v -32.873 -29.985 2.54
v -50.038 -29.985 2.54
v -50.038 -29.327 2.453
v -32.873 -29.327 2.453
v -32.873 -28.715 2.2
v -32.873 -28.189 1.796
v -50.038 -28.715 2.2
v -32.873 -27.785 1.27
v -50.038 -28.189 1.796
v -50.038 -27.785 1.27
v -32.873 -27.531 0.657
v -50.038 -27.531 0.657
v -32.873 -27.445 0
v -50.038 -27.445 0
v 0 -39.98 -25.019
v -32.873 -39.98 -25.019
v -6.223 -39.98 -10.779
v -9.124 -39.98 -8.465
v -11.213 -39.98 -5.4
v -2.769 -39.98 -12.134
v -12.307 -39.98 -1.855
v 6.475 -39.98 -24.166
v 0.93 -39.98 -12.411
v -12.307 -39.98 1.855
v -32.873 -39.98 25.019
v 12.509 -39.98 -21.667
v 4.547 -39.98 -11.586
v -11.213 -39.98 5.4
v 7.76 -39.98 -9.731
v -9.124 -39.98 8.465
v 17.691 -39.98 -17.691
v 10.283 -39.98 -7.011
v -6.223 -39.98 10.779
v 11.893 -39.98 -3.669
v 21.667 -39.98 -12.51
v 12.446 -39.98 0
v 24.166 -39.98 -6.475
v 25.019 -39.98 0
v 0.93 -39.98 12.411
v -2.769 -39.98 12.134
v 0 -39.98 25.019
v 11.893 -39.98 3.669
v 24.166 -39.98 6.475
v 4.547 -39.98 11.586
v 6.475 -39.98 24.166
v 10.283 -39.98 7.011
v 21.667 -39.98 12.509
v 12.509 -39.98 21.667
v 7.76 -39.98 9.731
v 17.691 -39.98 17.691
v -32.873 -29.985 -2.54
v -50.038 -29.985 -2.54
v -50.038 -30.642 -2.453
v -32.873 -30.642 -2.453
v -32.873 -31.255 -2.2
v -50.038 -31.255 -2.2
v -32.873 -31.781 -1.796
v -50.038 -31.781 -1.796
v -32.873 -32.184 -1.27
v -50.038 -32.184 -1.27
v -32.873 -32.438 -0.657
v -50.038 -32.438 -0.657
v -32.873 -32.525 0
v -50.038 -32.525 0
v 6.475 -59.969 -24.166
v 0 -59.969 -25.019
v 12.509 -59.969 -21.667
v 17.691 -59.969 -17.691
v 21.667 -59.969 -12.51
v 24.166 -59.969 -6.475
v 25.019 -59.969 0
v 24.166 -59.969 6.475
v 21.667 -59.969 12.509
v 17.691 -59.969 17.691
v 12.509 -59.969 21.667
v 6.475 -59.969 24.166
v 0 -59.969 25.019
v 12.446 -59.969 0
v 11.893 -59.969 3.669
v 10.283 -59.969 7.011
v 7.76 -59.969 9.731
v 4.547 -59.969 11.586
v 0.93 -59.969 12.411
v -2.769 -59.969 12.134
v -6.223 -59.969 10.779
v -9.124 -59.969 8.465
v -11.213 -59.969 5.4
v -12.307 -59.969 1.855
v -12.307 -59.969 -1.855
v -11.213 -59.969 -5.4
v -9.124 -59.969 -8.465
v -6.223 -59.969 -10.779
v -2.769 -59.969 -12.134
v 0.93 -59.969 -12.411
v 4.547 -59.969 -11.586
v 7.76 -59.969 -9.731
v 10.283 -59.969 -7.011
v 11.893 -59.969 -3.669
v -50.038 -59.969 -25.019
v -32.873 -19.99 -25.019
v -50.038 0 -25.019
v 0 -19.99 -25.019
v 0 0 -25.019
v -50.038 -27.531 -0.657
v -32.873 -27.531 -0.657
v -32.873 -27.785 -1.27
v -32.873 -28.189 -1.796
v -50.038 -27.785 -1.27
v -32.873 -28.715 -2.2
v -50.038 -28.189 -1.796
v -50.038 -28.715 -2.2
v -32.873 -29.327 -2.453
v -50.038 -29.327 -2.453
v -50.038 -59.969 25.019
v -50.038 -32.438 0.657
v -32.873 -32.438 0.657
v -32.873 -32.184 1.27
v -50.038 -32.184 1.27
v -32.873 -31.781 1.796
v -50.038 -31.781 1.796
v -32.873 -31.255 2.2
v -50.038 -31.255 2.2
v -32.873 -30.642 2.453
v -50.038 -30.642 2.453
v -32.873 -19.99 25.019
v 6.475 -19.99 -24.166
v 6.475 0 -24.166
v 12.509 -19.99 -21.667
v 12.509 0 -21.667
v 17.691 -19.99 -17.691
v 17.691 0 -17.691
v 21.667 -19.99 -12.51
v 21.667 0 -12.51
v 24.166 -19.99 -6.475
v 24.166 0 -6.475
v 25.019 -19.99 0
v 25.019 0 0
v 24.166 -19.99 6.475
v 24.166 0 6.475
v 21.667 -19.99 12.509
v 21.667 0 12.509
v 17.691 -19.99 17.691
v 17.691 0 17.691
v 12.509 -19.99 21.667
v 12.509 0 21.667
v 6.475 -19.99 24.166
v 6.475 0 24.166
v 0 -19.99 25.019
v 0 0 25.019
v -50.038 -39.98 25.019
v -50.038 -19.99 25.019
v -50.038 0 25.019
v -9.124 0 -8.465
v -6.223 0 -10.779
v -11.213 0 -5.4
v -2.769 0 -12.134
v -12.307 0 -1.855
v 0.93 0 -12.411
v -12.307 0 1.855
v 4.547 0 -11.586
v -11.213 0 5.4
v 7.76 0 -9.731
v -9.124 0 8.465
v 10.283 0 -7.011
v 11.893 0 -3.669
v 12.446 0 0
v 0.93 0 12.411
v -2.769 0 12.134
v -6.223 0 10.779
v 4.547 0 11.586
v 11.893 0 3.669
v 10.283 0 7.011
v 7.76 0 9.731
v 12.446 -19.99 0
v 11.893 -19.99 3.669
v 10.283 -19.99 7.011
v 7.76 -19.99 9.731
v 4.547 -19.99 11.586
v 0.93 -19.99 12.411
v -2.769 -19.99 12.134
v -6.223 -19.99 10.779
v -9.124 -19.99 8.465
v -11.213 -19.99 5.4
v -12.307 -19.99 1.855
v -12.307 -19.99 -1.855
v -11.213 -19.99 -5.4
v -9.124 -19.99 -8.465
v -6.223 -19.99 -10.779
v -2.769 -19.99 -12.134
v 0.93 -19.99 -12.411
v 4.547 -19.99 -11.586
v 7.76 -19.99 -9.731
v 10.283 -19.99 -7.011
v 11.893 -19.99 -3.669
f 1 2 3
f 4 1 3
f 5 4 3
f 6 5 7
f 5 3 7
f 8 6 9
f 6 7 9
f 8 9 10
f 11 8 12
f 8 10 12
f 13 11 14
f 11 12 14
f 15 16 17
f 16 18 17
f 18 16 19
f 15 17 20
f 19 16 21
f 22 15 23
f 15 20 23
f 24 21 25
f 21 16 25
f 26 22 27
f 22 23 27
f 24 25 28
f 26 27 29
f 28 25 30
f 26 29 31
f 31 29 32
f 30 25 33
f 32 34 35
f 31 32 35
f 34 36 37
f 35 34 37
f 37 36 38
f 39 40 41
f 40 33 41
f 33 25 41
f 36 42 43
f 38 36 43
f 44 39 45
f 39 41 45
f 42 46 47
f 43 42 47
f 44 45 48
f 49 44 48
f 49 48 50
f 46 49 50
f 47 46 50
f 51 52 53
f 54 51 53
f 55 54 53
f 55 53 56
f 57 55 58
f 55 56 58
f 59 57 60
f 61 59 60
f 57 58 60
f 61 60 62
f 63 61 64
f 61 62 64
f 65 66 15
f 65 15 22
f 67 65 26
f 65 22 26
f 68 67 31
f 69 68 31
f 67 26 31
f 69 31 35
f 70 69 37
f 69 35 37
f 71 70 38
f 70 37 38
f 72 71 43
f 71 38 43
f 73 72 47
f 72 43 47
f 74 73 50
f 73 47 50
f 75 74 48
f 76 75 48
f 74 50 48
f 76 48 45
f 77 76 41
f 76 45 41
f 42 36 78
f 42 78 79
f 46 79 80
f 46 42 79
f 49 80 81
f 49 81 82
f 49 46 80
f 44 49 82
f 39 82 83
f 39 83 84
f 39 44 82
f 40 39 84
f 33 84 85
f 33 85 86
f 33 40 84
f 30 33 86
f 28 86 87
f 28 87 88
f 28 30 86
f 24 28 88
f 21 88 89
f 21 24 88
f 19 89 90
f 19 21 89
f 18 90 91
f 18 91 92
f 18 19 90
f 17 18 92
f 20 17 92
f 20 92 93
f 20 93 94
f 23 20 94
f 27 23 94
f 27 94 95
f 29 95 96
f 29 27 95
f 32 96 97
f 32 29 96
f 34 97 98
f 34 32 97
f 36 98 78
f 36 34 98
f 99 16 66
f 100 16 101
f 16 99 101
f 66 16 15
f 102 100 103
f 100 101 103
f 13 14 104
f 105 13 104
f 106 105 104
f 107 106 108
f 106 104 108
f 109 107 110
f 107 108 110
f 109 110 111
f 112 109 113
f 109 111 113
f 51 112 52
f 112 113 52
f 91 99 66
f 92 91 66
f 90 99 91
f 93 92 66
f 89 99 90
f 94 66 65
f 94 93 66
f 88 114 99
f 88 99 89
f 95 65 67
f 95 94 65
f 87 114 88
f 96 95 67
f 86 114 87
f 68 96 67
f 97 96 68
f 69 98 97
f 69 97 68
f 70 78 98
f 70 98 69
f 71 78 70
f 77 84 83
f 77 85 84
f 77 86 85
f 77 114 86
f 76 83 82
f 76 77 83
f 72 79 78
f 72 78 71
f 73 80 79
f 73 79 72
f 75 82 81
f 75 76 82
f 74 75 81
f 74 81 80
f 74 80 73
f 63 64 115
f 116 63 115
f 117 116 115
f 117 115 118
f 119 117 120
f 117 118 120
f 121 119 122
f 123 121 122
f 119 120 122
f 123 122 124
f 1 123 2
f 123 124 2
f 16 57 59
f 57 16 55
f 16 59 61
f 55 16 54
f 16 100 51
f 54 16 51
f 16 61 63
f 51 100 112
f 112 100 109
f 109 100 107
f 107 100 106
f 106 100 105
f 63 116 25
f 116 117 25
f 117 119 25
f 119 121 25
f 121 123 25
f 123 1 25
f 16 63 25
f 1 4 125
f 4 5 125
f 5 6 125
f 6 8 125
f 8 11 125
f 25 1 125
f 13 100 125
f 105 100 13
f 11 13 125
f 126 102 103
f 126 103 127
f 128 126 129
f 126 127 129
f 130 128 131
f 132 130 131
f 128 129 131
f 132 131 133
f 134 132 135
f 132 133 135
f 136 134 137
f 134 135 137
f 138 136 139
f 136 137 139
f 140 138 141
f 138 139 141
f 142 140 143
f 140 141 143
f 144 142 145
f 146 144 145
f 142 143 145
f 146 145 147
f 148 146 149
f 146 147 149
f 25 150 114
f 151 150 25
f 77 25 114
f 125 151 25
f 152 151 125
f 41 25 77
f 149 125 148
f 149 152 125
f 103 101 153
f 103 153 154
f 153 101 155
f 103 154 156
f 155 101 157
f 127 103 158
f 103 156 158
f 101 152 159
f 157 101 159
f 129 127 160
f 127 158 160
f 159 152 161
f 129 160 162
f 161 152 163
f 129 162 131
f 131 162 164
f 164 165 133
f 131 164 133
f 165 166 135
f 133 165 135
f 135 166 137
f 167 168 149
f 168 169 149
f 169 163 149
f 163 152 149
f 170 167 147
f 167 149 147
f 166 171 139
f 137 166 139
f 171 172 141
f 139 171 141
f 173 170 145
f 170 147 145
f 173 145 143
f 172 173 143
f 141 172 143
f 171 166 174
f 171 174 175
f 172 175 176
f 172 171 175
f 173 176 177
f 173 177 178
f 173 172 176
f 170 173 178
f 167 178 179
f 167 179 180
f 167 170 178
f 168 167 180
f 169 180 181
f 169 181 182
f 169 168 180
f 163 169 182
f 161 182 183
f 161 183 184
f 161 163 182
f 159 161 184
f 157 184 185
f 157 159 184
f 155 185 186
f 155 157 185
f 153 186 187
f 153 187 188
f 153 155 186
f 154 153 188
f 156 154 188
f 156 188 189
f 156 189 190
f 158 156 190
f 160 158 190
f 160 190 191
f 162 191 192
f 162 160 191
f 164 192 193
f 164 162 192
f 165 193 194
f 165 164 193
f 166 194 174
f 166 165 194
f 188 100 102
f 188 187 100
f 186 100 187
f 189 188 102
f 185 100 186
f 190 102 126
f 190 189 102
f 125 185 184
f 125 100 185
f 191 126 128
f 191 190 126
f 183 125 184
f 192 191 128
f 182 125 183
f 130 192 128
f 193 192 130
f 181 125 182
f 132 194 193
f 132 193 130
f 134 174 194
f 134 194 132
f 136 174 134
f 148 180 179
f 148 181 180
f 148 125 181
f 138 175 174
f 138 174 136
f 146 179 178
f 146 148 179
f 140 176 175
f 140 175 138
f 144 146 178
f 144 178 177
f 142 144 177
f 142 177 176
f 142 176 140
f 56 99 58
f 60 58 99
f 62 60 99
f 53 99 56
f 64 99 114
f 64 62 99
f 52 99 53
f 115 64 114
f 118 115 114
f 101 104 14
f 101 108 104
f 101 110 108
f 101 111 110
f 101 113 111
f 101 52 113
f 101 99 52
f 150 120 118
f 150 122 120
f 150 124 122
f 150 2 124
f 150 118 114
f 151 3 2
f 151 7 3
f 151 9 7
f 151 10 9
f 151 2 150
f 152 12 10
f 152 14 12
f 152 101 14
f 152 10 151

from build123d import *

# Parameters (mm, degrees)
F0_R     = 12.446
F1_DEPTH = 19.9898
F3_R     = 12.446
F4_DEPTH = 19.9898
F5_W     = 17.1654498105
F5_H     = 50.038
F6_DEPTH = 19.9898
F8_DEPTH = 75.058


with BuildPart() as f1:
    # F0 (on Front) → F1 (new body)
    with BuildSketch(Plane.XZ):
        with BuildLine():
            Line((-50.038, -25.019), (0, -25.019))
            ThreePointArc((0, -25.019), (25.019, 0), (0, 25.019))
            Line((0, 25.019), (-50.038, 25.019))
            Line((-50.038, 25.019), (-50.038, -25.019))
        make_face()
        Circle(F0_R, mode=Mode.SUBTRACT)
    extrude(amount=F1_DEPTH)



with BuildPart() as f4:
    # F3 (on offset) → F4 (new body)
    with BuildSketch(Plane.XZ.offset(39.9796)):
        with BuildLine():
            Line((-50.038, 25.019), (-50.038, -25.019))
            Line((-50.038, -25.019), (0, -25.019))
            ThreePointArc((0, -25.019), (25.019, 0), (0, 25.019))
            Line((0, 25.019), (-50.038, 25.019))
        make_face()
        Circle(F3_R, mode=Mode.SUBTRACT)
    extrude(amount=F4_DEPTH)


with BuildPart() as f1_1:
    add(f1.part)

    add(f4.part)  # F6 merges F4
    # F5 (on face) → F6 (join, through all)
    with BuildSketch(Plane.XZ.offset(19.9898)):
        with Locations((-41.4552750947, 0)):
            Rectangle(F5_W, F5_H)
    extrude(amount=F6_DEPTH)

    # F7 (on face) → F8 (cut, through all)
    with BuildSketch(Plane(origin=(-50.038, 0, 0), x_dir=(0, -1, 0), z_dir=(-1, 0, 0))):
        with BuildLine():
            ThreePointArc((29.9847, -2.54), (31.7807512242, -1.7960512242), (32.5247, 0))
            ThreePointArc((32.5247, 0), (31.7807512242, 1.7960512242), (29.9847, 2.54))
            ThreePointArc((29.9847, 2.54), (28.1886487758, 1.7960512242), (27.4447, 0))
            ThreePointArc((27.4447, 0), (28.1886487758, -1.7960512242), (29.9847, -2.54))
        make_face()
    extrude(amount=-F8_DEPTH, mode=Mode.SUBTRACT)


solid = f1_1.part
